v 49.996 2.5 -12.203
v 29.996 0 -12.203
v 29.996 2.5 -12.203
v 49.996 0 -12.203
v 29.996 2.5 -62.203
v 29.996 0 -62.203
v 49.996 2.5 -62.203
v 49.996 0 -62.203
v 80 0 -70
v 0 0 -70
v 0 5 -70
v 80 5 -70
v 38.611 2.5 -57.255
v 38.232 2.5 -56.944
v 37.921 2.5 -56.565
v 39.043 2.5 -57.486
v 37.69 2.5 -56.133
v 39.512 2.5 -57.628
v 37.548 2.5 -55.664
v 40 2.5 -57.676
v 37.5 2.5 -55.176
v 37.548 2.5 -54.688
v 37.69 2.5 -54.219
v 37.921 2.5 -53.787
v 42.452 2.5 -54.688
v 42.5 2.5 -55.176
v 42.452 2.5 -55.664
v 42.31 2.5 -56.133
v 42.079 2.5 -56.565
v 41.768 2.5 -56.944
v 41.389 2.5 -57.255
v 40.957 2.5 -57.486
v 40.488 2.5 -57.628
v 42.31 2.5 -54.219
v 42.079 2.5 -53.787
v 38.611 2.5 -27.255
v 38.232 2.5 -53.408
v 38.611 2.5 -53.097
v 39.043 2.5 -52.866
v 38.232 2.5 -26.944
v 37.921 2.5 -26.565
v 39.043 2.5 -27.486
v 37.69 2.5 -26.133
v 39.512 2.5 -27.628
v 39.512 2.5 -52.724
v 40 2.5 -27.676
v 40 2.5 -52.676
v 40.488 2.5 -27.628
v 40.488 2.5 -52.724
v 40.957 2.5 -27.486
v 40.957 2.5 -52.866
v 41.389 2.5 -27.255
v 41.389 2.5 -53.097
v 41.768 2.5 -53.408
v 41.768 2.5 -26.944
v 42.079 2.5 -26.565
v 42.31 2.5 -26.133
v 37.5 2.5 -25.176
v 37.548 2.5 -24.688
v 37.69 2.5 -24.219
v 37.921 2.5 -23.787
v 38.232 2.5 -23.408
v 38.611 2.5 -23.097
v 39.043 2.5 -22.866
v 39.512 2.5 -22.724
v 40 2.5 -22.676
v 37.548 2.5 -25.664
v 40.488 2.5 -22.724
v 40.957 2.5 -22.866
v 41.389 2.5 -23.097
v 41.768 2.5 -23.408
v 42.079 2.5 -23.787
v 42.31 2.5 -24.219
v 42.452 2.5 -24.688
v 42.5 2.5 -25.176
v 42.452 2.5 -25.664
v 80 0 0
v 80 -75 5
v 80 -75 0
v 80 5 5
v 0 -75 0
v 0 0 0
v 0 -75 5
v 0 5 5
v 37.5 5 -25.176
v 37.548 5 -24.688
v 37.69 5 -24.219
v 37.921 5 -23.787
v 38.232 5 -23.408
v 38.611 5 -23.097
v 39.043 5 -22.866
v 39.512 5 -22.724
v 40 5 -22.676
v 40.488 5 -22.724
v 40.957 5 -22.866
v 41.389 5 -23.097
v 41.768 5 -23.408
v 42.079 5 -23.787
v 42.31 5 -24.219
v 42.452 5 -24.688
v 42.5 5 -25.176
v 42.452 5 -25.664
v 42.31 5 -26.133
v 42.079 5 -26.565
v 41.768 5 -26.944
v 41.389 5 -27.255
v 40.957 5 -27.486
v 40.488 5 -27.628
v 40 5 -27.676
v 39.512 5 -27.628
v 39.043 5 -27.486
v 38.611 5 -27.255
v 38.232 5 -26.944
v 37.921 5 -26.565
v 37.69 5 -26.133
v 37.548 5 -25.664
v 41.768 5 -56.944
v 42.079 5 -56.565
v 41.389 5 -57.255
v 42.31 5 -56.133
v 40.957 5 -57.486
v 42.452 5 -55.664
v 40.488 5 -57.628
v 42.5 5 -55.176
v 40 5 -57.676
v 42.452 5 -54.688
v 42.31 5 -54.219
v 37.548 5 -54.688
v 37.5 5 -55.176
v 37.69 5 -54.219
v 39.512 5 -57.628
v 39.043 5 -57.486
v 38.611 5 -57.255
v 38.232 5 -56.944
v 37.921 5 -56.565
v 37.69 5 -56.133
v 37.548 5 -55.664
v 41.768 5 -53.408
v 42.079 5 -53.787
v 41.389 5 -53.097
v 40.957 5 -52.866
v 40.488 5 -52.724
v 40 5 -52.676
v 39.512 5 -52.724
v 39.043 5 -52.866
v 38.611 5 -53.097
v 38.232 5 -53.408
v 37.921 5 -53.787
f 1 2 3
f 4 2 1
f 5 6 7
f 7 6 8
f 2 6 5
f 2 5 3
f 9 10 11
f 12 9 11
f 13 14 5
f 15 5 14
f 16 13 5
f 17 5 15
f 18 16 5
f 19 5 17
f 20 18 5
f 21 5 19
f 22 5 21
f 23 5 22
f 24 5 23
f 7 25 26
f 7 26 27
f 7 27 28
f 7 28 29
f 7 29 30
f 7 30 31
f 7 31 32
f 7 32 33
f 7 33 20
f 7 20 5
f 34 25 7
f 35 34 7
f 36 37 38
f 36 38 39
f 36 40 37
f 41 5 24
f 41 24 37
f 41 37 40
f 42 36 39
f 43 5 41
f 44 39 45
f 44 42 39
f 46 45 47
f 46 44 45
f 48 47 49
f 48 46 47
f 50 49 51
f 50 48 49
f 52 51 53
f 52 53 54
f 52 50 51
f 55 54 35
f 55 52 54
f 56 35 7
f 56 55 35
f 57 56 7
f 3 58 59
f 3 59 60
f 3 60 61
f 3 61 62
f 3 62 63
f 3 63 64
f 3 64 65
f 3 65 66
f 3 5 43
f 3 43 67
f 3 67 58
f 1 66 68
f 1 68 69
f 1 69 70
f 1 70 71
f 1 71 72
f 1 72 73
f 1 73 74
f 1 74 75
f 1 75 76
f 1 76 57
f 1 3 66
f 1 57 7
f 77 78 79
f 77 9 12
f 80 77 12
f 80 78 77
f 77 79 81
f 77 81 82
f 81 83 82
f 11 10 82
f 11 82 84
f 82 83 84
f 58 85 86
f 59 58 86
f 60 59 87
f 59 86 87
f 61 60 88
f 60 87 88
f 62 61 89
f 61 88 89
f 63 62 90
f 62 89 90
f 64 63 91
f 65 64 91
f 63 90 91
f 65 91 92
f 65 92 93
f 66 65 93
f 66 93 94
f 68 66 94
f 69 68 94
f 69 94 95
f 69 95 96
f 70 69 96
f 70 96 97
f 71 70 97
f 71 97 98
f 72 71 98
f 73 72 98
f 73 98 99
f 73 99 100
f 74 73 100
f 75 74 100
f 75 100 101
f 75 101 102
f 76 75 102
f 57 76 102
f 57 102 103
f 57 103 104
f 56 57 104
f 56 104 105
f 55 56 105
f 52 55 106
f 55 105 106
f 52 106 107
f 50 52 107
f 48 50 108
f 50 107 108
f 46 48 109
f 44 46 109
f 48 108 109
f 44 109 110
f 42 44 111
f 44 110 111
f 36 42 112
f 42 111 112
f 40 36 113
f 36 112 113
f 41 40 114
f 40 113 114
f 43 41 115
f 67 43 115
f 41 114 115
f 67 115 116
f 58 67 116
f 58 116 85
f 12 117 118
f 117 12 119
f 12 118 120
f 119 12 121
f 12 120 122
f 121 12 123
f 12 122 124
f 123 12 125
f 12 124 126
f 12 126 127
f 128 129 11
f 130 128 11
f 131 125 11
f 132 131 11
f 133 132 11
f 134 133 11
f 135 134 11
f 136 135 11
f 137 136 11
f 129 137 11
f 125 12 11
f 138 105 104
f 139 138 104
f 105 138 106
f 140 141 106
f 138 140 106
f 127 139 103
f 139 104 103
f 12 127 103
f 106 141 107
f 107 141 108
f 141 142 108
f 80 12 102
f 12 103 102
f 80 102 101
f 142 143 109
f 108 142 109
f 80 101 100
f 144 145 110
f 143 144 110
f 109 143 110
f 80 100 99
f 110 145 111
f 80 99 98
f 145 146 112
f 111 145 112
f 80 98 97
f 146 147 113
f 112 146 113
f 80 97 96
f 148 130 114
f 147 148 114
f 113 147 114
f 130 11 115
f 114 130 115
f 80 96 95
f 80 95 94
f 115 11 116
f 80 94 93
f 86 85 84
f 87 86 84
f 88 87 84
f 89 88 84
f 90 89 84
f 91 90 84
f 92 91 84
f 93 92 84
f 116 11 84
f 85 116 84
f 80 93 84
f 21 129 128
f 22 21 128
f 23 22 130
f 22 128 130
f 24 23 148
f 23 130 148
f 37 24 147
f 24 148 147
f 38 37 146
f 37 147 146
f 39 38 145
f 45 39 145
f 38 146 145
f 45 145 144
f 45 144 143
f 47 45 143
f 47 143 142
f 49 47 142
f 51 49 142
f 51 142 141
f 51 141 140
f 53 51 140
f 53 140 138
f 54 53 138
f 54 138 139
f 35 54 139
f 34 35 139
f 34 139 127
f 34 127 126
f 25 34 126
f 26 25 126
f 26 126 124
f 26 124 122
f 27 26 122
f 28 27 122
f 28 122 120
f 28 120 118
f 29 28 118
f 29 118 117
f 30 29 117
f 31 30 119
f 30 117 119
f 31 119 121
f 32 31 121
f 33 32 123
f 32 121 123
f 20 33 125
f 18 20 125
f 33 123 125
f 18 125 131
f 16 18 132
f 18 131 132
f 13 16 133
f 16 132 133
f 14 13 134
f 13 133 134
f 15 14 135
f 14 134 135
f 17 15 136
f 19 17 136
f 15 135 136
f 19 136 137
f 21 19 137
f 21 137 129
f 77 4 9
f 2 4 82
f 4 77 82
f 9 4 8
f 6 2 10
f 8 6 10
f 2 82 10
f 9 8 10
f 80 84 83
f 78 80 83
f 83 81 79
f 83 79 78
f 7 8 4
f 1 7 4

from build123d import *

# Parameters (mm, degrees)
F0_W     = 75
F0_H     = 5
F1_DEPTH = 80
F2_W     = 20
F2_H     = 50
F3_DEPTH = 2.5
F5_D     = 5


with BuildPart() as f1:
    # F0 (on Right) → F1 (new body)
    with BuildSketch(Plane.YZ):
        with Locations((-37.5, 2.5)):
            Rectangle(F0_W, F0_H)
        Polygon((5, 5), (0, 5), (0, 0), (0, -70), (5, -70), align=None)
    extrude(amount=F1_DEPTH)

    # F2 (on Front) → F3 (cut)
    with BuildSketch(Plane.XZ):
        with Locations((39.995763, -37.202657)):
            Rectangle(F2_W, F2_H)
    extrude(amount=-F3_DEPTH, mode=Mode.SUBTRACT)

    # F5 (through all)
    with Locations(Plane.XZ):
        with Locations((40.000014, -25.175888), (40.000014, -55.175888)):
            Hole(F5_D / 2)


solid = f1.part
